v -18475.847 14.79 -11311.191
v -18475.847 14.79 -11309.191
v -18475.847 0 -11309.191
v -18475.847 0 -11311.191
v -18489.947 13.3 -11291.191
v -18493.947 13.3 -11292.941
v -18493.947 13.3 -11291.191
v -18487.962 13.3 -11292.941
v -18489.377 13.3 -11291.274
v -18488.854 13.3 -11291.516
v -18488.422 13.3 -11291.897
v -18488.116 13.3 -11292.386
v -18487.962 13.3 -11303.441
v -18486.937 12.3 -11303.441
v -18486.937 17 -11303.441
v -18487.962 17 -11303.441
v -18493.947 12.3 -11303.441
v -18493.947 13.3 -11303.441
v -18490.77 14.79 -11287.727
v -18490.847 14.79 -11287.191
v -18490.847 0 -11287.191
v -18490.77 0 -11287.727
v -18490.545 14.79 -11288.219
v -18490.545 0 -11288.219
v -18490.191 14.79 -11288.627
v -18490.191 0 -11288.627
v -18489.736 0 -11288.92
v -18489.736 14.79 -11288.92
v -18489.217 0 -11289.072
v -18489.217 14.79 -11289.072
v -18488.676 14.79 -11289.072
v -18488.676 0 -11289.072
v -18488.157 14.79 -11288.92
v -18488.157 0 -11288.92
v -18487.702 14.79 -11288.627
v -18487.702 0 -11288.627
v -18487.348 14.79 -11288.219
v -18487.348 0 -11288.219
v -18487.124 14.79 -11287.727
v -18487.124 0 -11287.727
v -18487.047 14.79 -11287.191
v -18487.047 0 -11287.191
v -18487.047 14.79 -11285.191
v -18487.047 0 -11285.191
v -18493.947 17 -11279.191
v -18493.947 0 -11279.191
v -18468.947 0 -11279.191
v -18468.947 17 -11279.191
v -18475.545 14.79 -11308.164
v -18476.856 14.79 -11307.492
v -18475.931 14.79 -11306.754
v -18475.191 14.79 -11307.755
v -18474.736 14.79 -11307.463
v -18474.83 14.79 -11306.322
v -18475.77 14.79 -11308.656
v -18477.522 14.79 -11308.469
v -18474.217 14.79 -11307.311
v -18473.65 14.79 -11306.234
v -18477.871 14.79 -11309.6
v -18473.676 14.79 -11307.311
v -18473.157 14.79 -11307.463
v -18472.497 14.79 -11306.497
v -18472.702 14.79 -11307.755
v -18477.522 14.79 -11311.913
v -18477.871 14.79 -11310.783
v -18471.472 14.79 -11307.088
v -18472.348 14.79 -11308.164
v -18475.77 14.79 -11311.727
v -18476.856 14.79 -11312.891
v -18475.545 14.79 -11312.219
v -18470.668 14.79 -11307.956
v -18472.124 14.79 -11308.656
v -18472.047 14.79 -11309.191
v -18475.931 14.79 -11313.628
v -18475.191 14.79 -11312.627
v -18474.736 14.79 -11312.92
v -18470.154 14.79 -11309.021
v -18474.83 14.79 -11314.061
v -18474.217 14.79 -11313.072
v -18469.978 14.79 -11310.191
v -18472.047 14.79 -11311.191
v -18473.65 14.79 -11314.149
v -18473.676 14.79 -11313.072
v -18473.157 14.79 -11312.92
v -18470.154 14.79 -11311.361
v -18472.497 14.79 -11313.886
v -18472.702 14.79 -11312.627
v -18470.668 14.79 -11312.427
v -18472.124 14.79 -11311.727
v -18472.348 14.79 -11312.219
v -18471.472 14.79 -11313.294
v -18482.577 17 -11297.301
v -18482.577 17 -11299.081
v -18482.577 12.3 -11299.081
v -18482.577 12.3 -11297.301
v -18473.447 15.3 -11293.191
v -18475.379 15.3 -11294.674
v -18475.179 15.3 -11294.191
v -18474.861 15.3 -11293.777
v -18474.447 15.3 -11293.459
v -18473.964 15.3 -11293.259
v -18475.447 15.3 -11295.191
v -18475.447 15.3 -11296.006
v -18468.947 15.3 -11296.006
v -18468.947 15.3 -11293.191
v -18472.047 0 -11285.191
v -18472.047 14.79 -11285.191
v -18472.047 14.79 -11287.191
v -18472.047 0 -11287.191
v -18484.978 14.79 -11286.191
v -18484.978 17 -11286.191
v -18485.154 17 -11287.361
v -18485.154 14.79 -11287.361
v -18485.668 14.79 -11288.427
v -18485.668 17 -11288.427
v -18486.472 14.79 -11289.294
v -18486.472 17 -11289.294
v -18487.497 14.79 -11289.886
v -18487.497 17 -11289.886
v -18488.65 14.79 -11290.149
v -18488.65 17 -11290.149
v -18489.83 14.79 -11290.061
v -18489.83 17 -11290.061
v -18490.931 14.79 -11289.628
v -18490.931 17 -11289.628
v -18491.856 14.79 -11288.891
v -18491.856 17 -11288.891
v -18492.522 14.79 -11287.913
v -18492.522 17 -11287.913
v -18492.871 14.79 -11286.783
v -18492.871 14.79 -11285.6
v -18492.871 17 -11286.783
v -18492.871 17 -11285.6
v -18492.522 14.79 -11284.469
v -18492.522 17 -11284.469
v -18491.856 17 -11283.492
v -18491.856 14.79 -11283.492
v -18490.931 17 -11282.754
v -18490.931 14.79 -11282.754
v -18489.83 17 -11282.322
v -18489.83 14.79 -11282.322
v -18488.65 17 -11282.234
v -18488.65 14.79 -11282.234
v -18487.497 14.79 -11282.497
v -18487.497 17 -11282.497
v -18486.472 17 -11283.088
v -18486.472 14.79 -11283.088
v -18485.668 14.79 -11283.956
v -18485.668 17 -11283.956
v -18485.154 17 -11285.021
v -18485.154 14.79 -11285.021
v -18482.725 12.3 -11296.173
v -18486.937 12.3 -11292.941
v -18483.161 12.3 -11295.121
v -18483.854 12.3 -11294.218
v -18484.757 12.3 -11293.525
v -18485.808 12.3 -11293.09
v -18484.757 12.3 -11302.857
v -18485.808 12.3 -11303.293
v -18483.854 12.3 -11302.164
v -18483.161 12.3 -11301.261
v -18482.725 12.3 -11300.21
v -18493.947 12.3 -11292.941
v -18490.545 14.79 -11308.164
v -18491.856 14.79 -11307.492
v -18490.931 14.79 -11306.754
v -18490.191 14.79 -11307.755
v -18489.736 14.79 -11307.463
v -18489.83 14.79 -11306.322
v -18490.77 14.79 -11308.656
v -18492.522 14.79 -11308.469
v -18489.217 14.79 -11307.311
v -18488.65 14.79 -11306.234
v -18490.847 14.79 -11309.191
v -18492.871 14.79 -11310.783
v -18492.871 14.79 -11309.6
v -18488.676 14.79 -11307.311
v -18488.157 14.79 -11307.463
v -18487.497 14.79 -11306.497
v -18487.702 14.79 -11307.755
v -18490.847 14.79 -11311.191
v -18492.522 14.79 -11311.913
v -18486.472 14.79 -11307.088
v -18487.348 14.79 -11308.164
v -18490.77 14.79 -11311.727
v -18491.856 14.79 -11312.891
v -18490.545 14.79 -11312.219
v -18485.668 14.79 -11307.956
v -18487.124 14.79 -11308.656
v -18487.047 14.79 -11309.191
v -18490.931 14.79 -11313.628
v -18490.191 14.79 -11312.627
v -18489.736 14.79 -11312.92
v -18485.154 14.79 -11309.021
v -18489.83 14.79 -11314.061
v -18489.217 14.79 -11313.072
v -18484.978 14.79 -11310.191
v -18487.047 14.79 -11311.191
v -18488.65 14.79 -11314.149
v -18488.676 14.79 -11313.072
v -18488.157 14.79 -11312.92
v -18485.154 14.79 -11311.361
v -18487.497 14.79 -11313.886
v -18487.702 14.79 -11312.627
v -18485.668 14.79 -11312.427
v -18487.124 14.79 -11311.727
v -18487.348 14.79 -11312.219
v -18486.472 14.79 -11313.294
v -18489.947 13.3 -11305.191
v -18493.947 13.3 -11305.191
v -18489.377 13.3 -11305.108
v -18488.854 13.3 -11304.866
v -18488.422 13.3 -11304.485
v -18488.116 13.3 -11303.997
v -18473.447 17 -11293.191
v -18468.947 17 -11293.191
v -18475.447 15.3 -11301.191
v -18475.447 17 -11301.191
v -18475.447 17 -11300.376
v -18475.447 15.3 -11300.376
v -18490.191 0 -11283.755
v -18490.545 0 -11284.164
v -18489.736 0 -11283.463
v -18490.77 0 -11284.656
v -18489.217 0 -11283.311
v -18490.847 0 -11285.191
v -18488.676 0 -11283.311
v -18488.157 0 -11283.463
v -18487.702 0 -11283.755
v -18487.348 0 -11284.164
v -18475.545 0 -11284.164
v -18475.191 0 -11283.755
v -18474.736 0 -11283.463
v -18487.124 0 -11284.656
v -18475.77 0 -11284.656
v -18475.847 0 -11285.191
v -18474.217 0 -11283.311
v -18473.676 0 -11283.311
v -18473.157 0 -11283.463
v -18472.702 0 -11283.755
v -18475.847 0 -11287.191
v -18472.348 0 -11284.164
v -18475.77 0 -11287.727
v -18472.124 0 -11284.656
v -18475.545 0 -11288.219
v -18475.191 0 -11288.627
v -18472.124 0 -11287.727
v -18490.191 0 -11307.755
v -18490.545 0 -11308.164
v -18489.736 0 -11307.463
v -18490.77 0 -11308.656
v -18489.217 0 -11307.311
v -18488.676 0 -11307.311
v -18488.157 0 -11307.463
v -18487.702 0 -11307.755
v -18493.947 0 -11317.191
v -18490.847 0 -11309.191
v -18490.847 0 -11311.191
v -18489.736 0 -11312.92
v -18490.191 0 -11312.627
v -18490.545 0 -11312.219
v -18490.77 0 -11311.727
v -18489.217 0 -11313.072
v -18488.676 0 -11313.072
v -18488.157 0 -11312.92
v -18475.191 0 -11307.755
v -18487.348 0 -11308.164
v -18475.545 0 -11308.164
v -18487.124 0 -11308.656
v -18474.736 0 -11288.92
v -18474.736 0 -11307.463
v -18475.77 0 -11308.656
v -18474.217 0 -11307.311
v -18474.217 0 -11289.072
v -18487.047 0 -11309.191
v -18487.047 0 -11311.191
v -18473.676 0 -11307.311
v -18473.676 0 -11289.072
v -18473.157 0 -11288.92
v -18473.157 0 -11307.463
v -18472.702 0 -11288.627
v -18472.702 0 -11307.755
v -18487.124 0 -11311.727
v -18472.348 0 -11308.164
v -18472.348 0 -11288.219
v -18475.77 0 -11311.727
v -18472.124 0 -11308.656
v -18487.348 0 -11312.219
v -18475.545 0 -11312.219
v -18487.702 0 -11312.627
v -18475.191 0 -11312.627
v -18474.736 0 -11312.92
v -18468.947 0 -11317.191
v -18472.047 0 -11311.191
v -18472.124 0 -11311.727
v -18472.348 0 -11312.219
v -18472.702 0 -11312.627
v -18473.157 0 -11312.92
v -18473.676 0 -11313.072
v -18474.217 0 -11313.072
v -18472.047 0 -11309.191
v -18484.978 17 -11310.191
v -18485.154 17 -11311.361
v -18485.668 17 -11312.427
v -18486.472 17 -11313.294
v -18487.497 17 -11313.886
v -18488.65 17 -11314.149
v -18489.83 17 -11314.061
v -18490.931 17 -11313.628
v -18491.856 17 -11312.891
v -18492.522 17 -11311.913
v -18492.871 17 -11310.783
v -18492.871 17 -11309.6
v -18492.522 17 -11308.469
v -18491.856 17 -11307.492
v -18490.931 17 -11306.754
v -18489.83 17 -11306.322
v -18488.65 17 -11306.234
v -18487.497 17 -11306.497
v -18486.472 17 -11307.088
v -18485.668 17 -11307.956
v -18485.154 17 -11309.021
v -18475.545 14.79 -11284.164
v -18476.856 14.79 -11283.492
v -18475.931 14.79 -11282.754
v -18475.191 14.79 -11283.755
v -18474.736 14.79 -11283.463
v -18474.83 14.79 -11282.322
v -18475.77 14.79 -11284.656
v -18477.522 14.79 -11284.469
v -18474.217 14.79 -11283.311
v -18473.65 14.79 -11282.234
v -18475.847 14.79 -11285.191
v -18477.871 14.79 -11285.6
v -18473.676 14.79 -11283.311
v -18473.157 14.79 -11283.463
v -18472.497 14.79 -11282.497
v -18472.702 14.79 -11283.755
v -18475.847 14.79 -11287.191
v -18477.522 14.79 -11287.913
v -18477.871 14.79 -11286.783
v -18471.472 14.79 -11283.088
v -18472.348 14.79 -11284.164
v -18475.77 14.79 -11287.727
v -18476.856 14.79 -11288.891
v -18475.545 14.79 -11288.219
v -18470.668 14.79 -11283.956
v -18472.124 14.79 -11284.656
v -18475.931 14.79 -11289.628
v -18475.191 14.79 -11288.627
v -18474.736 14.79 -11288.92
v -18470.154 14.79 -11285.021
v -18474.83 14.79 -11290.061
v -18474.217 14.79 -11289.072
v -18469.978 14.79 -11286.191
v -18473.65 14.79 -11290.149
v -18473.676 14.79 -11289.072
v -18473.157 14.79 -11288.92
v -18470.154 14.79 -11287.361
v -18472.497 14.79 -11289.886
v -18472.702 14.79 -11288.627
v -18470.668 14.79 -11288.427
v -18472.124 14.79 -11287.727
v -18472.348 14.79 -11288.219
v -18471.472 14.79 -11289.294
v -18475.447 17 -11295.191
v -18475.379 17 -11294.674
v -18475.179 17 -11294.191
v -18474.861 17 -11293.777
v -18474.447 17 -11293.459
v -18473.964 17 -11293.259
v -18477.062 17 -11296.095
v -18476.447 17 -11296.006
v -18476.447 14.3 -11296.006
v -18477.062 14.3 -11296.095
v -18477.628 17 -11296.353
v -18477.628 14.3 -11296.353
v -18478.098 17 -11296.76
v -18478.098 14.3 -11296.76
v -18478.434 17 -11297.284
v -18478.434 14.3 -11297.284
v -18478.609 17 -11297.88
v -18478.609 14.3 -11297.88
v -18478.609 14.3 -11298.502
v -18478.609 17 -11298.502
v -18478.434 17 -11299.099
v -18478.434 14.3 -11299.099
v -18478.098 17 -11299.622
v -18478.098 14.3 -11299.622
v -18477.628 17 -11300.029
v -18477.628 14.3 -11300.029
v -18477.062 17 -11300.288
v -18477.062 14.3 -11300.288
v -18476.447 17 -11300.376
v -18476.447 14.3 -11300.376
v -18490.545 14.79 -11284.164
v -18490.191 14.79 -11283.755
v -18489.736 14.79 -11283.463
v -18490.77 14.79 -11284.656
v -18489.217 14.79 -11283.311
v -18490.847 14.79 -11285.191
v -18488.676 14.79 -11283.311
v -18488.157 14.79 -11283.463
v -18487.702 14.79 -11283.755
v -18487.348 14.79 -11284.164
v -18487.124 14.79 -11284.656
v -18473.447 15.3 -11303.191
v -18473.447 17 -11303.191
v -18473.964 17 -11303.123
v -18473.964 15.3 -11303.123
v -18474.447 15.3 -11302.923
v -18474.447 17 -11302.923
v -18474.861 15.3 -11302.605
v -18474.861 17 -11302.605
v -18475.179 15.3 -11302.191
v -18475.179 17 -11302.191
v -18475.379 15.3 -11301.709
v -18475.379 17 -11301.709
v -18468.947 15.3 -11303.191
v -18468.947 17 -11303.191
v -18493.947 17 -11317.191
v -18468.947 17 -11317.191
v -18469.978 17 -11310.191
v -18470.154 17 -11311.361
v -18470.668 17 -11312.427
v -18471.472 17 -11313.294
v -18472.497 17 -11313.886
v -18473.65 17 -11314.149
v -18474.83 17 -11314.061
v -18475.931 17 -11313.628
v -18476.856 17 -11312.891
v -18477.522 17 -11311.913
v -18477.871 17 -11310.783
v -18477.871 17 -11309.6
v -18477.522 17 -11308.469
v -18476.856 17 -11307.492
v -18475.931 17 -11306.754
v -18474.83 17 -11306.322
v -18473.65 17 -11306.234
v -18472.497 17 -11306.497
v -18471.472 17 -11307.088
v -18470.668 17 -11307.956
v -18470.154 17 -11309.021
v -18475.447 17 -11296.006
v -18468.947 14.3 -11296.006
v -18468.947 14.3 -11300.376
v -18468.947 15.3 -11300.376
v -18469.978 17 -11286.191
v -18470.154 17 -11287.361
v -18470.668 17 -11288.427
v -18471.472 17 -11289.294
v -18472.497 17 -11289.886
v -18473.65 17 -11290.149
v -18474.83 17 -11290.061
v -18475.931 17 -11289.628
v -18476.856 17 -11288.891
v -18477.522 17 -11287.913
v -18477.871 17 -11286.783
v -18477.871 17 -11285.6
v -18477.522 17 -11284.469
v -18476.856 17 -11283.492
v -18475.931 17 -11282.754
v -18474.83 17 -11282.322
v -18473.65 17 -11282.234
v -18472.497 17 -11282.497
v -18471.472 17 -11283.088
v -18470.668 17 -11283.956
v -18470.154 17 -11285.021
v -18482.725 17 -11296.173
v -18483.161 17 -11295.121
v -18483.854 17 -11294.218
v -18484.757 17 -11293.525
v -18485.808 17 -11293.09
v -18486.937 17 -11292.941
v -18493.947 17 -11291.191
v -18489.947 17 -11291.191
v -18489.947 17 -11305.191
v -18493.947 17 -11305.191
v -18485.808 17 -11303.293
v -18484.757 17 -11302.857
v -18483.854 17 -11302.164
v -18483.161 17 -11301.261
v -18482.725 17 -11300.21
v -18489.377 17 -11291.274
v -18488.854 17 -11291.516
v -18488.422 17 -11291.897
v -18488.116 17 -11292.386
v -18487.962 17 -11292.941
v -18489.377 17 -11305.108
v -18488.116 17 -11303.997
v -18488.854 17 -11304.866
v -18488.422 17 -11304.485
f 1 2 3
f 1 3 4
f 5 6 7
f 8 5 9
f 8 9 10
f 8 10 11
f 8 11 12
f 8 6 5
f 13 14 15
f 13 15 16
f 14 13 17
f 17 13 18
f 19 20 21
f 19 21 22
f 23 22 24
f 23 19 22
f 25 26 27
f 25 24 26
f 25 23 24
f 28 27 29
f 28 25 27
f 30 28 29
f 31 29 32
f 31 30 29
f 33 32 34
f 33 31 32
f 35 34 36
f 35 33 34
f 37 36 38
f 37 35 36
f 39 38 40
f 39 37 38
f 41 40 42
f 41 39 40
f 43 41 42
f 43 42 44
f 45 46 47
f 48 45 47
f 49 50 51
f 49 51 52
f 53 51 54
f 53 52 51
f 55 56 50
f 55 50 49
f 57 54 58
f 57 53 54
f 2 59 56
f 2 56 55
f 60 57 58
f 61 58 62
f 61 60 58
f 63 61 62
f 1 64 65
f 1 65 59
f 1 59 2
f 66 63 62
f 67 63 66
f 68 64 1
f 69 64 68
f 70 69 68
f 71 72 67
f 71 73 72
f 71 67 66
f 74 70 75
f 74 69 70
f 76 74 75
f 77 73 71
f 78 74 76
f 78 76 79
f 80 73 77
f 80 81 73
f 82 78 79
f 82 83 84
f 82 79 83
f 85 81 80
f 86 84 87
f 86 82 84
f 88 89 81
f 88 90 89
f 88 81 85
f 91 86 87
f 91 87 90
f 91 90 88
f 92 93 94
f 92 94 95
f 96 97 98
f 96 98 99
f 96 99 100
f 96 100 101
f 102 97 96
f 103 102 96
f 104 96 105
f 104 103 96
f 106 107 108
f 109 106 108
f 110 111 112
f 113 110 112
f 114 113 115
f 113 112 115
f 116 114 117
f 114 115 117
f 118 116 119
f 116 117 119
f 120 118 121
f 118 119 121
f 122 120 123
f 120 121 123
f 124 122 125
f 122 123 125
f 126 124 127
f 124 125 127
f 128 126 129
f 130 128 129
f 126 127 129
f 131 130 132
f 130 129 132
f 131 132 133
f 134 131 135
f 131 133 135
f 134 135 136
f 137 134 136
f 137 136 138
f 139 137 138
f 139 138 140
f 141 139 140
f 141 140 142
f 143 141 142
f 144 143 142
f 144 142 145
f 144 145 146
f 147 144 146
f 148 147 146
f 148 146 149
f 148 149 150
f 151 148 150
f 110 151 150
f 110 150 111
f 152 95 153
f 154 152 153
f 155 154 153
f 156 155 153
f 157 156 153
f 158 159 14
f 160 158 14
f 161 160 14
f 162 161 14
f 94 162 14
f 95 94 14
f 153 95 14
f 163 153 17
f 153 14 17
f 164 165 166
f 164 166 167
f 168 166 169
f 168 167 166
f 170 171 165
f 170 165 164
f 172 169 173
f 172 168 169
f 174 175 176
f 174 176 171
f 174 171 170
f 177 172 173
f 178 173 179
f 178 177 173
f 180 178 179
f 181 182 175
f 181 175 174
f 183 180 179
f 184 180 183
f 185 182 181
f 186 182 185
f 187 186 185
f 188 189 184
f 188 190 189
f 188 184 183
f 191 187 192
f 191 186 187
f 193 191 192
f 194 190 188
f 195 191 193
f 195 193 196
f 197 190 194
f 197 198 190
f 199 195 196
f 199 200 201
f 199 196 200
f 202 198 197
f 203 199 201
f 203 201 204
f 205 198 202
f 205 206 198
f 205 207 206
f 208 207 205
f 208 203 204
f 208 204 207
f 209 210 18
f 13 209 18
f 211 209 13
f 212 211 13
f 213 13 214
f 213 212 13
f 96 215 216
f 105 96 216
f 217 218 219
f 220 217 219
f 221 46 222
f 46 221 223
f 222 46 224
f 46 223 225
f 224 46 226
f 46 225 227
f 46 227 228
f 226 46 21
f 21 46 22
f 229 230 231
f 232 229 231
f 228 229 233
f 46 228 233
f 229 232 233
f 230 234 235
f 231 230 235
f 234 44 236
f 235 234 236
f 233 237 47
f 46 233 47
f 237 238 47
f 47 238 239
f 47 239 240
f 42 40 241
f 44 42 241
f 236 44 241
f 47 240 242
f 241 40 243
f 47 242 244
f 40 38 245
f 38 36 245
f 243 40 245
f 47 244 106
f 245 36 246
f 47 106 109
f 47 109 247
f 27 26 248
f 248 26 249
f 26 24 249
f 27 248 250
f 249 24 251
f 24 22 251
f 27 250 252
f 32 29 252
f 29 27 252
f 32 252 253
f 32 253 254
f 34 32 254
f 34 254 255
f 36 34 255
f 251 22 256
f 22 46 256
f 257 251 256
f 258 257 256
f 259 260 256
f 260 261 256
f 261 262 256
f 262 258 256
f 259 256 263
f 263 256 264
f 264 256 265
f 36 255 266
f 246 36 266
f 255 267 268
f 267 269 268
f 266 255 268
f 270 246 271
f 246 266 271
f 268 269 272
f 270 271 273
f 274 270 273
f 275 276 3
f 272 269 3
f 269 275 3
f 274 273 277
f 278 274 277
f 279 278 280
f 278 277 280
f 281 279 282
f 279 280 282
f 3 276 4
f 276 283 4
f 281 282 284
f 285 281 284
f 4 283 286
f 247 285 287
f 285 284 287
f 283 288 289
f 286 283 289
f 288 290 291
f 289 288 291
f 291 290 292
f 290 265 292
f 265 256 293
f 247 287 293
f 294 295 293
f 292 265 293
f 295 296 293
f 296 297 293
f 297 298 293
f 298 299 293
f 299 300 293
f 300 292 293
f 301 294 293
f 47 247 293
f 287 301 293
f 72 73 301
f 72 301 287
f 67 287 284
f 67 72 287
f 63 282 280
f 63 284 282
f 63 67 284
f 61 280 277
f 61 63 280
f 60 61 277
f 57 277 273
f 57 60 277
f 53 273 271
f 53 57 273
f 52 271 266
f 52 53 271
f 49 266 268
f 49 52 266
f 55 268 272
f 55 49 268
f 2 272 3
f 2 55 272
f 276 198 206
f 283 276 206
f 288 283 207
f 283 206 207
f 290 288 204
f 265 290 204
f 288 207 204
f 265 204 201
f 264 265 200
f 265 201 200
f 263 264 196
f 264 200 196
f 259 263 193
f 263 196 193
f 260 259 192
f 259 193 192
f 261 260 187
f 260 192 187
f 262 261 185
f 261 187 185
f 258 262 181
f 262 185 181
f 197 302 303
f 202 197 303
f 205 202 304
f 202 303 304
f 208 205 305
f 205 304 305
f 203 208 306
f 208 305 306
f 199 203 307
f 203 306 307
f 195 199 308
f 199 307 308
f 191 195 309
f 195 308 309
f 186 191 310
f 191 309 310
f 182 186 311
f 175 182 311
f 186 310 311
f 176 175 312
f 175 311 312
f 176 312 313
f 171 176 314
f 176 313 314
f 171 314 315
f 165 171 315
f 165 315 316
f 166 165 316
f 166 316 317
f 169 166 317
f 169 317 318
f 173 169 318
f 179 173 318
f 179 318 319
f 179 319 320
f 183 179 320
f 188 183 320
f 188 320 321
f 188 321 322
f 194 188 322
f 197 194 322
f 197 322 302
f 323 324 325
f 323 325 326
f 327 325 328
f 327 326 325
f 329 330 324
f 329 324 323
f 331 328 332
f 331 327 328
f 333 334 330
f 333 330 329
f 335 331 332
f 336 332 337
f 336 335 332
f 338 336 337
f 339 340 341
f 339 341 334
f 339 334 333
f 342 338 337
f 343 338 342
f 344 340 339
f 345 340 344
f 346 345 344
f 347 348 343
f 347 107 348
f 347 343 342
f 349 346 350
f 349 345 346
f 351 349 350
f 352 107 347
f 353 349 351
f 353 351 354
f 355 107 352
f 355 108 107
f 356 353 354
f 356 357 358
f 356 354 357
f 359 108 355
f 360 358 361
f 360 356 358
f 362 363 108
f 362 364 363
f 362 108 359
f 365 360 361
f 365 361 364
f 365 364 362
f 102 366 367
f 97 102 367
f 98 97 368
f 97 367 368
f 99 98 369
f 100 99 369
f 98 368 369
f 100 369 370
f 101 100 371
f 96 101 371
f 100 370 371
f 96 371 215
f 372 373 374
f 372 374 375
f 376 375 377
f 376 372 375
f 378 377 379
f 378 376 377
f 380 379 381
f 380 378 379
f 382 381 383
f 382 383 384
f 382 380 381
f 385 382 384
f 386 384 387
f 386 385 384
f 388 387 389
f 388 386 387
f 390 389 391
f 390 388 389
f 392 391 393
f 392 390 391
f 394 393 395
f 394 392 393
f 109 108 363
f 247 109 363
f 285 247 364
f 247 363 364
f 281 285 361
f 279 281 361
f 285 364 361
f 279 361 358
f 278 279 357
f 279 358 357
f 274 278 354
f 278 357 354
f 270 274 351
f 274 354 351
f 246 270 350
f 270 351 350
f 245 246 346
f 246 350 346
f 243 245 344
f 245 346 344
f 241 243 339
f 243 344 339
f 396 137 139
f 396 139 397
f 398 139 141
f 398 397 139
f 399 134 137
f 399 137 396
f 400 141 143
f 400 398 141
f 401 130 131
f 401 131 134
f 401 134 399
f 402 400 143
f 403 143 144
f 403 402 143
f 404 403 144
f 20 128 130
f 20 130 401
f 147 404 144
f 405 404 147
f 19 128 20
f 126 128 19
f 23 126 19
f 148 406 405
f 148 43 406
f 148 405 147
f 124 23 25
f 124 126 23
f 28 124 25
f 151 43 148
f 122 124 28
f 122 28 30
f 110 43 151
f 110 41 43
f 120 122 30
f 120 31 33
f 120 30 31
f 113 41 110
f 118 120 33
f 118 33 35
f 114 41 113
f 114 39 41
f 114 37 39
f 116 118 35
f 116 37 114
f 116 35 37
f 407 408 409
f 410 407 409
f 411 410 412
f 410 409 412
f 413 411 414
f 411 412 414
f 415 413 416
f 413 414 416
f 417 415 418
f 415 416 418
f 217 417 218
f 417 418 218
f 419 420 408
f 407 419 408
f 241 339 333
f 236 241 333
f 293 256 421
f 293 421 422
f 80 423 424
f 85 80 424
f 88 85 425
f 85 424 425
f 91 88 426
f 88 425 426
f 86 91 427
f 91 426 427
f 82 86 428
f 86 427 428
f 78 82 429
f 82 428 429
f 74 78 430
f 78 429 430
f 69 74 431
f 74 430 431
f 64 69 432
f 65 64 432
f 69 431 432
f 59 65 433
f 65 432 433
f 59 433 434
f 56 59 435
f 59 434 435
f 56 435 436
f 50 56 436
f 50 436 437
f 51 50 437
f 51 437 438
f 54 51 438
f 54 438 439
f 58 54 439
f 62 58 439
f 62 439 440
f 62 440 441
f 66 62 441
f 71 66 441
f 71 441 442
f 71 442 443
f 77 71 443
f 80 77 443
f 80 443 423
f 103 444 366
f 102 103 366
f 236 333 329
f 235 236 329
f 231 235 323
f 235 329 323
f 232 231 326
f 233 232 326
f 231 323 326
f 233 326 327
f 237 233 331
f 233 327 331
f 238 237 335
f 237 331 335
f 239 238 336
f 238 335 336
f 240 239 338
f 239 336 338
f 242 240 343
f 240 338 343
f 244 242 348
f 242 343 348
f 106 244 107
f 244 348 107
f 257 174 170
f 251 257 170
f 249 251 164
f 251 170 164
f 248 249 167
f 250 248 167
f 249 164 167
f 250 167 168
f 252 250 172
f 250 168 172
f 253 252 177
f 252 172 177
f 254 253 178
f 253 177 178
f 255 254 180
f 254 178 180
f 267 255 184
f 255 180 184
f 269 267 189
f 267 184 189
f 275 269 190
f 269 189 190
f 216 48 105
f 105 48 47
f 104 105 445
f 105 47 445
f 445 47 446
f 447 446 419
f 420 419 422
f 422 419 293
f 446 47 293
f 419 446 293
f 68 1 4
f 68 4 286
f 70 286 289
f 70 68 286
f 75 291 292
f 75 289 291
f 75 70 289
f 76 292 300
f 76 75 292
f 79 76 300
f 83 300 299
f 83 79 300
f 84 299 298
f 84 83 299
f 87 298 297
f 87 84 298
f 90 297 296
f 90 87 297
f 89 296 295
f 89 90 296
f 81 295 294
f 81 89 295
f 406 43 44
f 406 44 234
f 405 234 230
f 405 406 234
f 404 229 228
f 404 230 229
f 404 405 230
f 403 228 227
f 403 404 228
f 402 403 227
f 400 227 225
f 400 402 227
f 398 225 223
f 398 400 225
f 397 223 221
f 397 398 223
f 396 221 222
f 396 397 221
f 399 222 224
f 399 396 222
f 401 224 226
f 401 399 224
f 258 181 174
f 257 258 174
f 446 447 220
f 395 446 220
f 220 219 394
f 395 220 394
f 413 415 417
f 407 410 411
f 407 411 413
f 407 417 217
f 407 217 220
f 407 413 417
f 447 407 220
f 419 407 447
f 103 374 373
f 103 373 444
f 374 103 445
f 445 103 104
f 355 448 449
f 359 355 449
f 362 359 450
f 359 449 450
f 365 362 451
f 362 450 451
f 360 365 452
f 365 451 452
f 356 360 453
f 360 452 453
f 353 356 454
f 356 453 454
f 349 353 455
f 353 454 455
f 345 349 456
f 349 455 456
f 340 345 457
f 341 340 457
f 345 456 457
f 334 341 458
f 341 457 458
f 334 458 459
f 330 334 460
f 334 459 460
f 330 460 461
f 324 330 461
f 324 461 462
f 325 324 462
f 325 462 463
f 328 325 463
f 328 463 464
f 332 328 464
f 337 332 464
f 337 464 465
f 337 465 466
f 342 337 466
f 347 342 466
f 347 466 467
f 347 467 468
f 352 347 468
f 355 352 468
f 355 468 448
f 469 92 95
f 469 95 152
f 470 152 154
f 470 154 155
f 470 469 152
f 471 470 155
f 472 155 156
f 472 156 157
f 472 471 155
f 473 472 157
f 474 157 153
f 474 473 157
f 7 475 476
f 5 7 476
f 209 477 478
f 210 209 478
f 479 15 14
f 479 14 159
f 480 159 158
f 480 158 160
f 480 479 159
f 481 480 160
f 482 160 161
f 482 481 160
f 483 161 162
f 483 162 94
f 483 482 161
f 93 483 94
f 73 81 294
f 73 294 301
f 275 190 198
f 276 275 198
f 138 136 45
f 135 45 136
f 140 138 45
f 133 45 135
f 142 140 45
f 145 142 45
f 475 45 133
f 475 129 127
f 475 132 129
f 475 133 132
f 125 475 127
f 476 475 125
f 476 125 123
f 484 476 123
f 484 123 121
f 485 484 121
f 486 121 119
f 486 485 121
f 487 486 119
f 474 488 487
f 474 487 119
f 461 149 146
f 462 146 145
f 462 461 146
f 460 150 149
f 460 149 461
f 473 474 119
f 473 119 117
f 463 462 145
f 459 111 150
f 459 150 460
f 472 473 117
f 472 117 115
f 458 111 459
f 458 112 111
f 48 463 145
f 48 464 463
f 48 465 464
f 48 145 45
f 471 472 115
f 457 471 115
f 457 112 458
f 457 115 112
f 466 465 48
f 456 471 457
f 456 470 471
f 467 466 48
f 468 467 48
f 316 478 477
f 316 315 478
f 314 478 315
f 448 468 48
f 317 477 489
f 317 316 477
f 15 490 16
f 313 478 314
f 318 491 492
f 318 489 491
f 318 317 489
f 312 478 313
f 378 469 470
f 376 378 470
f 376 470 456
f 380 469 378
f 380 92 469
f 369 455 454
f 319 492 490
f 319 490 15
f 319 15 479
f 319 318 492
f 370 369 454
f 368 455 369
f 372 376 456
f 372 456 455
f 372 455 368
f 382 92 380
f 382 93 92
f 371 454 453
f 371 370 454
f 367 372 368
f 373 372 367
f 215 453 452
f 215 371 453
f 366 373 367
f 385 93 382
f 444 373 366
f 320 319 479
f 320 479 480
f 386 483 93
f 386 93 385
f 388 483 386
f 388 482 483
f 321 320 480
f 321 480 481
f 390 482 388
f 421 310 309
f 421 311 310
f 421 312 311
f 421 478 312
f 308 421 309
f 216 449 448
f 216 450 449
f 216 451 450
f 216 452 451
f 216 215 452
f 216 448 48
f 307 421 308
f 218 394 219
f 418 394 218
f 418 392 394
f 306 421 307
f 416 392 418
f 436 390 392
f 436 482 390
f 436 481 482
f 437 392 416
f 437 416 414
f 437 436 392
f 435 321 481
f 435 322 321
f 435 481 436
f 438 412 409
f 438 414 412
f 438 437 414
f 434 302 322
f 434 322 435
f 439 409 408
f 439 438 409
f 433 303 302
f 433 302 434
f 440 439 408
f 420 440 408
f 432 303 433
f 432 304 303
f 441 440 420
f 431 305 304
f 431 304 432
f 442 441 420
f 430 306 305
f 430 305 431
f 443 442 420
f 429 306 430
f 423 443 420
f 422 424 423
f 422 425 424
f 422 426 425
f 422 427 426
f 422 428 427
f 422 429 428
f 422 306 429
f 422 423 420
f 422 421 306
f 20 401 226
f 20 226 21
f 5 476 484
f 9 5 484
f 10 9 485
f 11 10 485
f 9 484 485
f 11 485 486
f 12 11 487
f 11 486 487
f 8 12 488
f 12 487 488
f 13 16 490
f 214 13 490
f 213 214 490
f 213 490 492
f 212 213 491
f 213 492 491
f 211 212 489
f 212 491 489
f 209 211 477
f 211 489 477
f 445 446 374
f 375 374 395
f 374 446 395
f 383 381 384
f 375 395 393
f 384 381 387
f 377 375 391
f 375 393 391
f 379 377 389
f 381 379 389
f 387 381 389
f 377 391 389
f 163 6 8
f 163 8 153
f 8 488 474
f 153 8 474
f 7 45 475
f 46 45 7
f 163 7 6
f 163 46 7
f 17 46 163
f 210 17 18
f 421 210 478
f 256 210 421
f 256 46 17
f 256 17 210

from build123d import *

# Parameters (mm, degrees)
SKETCH1_W                                           = 25
SKETCH1_H                                           = 38
BOSS_EXTRUDE1_DEPTH                                 = 17
CUT_EXTRUDE3_DEPTH                                  = 3.7
CUT_EXTRUDE4_DEPTH                                  = 1.7
CBORE_FOR_6_BINDING_HEAD_MACHINE_SCREW1_D           = 3.7973
CBORE_FOR_6_BINDING_HEAD_MACHINE_SCREW1_CBORE_D     = 7.9375
CBORE_FOR_6_BINDING_HEAD_MACHINE_SCREW1_CBORE_DEPTH = 2.2098
SKETCH12_W                                          = 1
SKETCH12_H                                          = 4.37
SKETCH12_W_2                                        = 6.5
CUT_EXTRUDE5_DEPTH                                  = 2.7
CUT_EXTRUDE6_DEPTH                                  = 4.7
CUT_EXTRUDE7_DEPTH                                  = 21682.908892909


with BuildPart() as part:
    # Sketch1 → Boss-Extrude1 (new body)
    with BuildSketch(Plane(origin=(0, 0, 0), x_dir=(1, 0, 0), z_dir=(0, 1, 0))):
        with Locations((-18481.446731235, 11298.191283293)):
            Rectangle(SKETCH1_W, SKETCH1_H)
    extrude(amount=BOSS_EXTRUDE1_DEPTH)

    # Sketch2 → Cut-Extrude3 (cut)
    with BuildSketch(Plane(origin=(0, 17, 0), x_dir=(1, 0, 0), z_dir=(0, 1, 0))):
        with BuildLine():
            Line((-18493.946731235, 11291.191283293), (-18489.946731235, 11291.191283293))
            ThreePointArc((-18489.946731235, 11291.191283293), (-18488.532517672, 11291.777069731), (-18487.946731235, 11293.191283293))
            Line((-18487.946731235, 11293.191283293), (-18487.946731235, 11303.191283293))
            ThreePointArc((-18487.946731235, 11303.191283293), (-18488.532517672, 11304.605496855), (-18489.946731235, 11305.191283293))
            Line((-18489.946731235, 11305.191283293), (-18493.946731235, 11305.191283293))
            Line((-18493.946731235, 11305.191283293), (-18493.946731235, 11291.191283293))
        make_face()
    extrude(amount=-CUT_EXTRUDE3_DEPTH, mode=Mode.SUBTRACT)

    # Sketch2<6> → Cut-Extrude4 (cut)
    with BuildSketch(Plane(origin=(0, 17, 0), x_dir=(1, 0, 0), z_dir=(0, 1, 0))):
        with BuildLine():
            Line((-18475.446731235, 11301.191283293), (-18475.446731235, 11295.191283293))
            ThreePointArc((-18475.446731235, 11295.191283293), (-18474.860944797, 11293.777069731), (-18473.446731235, 11293.191283293))
            Line((-18473.446731235, 11293.191283293), (-18468.946731235, 11293.191283293))
            Line((-18468.946731235, 11293.191283293), (-18468.946731235, 11303.191283293))
            Line((-18468.946731235, 11303.191283293), (-18473.446731235, 11303.191283293))
            ThreePointArc((-18473.446731235, 11303.191283293), (-18474.860944797, 11302.605496855), (-18475.446731235, 11301.191283293))
        make_face()
    extrude(amount=-CUT_EXTRUDE4_DEPTH, mode=Mode.SUBTRACT)

    # CBORE for #6 Binding Head Machine Screw1 (through all)
    with Locations(Plane(origin=(0, 17, 0), x_dir=(1, 0, 0), z_dir=(0, 1, 0))):
        with Locations((-18488.946731235, 11310.191283293), (-18473.946731235, 11310.191283293), (-18473.946731235, 11286.191283293), (-18488.946731235, 11286.191283293)):
            CounterBoreHole(CBORE_FOR_6_BINDING_HEAD_MACHINE_SCREW1_D / 2, CBORE_FOR_6_BINDING_HEAD_MACHINE_SCREW1_CBORE_D / 2, CBORE_FOR_6_BINDING_HEAD_MACHINE_SCREW1_CBORE_DEPTH)

    # Sketch12 → Cut-Extrude5 (cut)
    with BuildSketch(Plane(origin=(0, 17, 0), x_dir=(1, 0, 0), z_dir=(0, 1, 0))):
        with BuildLine():
            Line((-18476.446731235, 11300.376283293), (-18476.446731235, 11296.006283293))
            ThreePointArc((-18476.446731235, 11296.006283293), (-18478.631731235, 11298.191283293), (-18476.446731235, 11300.376283293))
        make_face()
        with Locations((-18475.946731235, 11298.191283293)):
            Rectangle(SKETCH12_W, SKETCH12_H)
        with Locations((-18472.196731235, 11298.191283293)):
            Rectangle(SKETCH12_W_2, SKETCH12_H)
    extrude(amount=-CUT_EXTRUDE5_DEPTH, mode=Mode.SUBTRACT)

    # Sketch13 → Cut-Extrude6 (cut)
    with BuildSketch(Plane(origin=(0, 17, 0), x_dir=(1, 0, 0), z_dir=(0, 1, 0))):
        with BuildLine():
            ThreePointArc((-18486.936731235, 11303.441283293), (-18483.853745669, 11302.164268859), (-18482.576731235, 11299.081283293))
            Line((-18482.576731235, 11299.081283293), (-18482.576731235, 11297.301283293))
            ThreePointArc((-18482.576731235, 11297.301283293), (-18483.853745669, 11294.218297727), (-18486.936731235, 11292.941283293))
            Line((-18486.936731235, 11292.941283293), (-18486.946731235, 11292.941283293))
            Line((-18486.946731235, 11292.941283293), (-18486.946731235, 11303.441283293))
            Line((-18486.946731235, 11303.441283293), (-18486.936731235, 11303.441283293))
        make_face()
        with BuildLine():
            ThreePointArc((-18487.946731235, 11303.191283293), (-18487.950656716, 11303.316529118), (-18487.962417752, 11303.441283293))
            Line((-18487.962417752, 11303.441283293), (-18493.946731235, 11303.441283293))
            Line((-18493.946731235, 11303.441283293), (-18493.946731235, 11292.941283293))
            Line((-18493.946731235, 11292.941283293), (-18487.962417752, 11292.941283293))
            ThreePointArc((-18487.962417752, 11292.941283293), (-18487.950656716, 11293.066037468), (-18487.946731235, 11293.191283293))
            Line((-18487.946731235, 11293.191283293), (-18487.946731235, 11303.191283293))
        make_face()
        with BuildLine():
            Line((-18486.946731235, 11292.941283293), (-18486.946731235, 11303.441283293))
            Line((-18486.946731235, 11303.441283293), (-18487.962417752, 11303.441283293))
            ThreePointArc((-18487.962417752, 11303.441283293), (-18487.950656716, 11303.316529118), (-18487.946731235, 11303.191283293))
            Line((-18487.946731235, 11303.191283293), (-18487.946731235, 11293.191283293))
            ThreePointArc((-18487.946731235, 11293.191283293), (-18487.950656716, 11293.066037468), (-18487.962417752, 11292.941283293))
            Line((-18487.962417752, 11292.941283293), (-18486.946731235, 11292.941283293))
        make_face()
    extrude(amount=-CUT_EXTRUDE6_DEPTH, mode=Mode.SUBTRACT)

    # Sketch14 → Cut-Extrude7 (cut, through all)
    with BuildSketch(Plane(origin=(0, 17, 0), x_dir=(1, 0, 0), z_dir=(0, 1, 0))):
        with BuildLine():
            Line((-18487.046731235, 11309.191283293), (-18487.046731235, 11311.191283293))
            ThreePointArc((-18487.046731235, 11311.191283293), (-18488.946731235, 11313.091283293), (-18490.846731235, 11311.191283293))
            Line((-18490.846731235, 11311.191283293), (-18490.846731235, 11309.191283293))
            ThreePointArc((-18490.846731235, 11309.191283293), (-18488.946731235, 11307.291283293), (-18487.046731235, 11309.191283293))
        make_face()
        with BuildLine():
            ThreePointArc((-18475.846731235, 11311.191283293), (-18473.946731235, 11313.091283293), (-18472.046731235, 11311.191283293))
            Line((-18472.046731235, 11311.191283293), (-18472.046731235, 11309.191283293))
            ThreePointArc((-18472.046731235, 11309.191283293), (-18473.946731235, 11307.291283293), (-18475.846731235, 11309.191283293))
            Line((-18475.846731235, 11309.191283293), (-18475.846731235, 11311.191283293))
        make_face()
        with BuildLine():
            ThreePointArc((-18487.046731235, 11285.191283293), (-18488.946731235, 11283.291283293), (-18490.846731235, 11285.191283293))
            Line((-18490.846731235, 11285.191283293), (-18490.846731235, 11287.191283293))
            ThreePointArc((-18490.846731235, 11287.191283293), (-18488.946731235, 11289.091283293), (-18487.046731235, 11287.191283293))
            Line((-18487.046731235, 11287.191283293), (-18487.046731235, 11285.191283293))
        make_face()
        with BuildLine():
            Line((-18475.846731235, 11287.191283293), (-18475.846731235, 11285.191283293))
            ThreePointArc((-18475.846731235, 11285.191283293), (-18473.946731235, 11283.291283293), (-18472.046731235, 11285.191283293))
            Line((-18472.046731235, 11285.191283293), (-18472.046731235, 11287.191283293))
            ThreePointArc((-18472.046731235, 11287.191283293), (-18473.946731235, 11289.091283293), (-18475.846731235, 11287.191283293))
        make_face()
    extrude(amount=-CUT_EXTRUDE7_DEPTH, mode=Mode.SUBTRACT)


solid = part.part
